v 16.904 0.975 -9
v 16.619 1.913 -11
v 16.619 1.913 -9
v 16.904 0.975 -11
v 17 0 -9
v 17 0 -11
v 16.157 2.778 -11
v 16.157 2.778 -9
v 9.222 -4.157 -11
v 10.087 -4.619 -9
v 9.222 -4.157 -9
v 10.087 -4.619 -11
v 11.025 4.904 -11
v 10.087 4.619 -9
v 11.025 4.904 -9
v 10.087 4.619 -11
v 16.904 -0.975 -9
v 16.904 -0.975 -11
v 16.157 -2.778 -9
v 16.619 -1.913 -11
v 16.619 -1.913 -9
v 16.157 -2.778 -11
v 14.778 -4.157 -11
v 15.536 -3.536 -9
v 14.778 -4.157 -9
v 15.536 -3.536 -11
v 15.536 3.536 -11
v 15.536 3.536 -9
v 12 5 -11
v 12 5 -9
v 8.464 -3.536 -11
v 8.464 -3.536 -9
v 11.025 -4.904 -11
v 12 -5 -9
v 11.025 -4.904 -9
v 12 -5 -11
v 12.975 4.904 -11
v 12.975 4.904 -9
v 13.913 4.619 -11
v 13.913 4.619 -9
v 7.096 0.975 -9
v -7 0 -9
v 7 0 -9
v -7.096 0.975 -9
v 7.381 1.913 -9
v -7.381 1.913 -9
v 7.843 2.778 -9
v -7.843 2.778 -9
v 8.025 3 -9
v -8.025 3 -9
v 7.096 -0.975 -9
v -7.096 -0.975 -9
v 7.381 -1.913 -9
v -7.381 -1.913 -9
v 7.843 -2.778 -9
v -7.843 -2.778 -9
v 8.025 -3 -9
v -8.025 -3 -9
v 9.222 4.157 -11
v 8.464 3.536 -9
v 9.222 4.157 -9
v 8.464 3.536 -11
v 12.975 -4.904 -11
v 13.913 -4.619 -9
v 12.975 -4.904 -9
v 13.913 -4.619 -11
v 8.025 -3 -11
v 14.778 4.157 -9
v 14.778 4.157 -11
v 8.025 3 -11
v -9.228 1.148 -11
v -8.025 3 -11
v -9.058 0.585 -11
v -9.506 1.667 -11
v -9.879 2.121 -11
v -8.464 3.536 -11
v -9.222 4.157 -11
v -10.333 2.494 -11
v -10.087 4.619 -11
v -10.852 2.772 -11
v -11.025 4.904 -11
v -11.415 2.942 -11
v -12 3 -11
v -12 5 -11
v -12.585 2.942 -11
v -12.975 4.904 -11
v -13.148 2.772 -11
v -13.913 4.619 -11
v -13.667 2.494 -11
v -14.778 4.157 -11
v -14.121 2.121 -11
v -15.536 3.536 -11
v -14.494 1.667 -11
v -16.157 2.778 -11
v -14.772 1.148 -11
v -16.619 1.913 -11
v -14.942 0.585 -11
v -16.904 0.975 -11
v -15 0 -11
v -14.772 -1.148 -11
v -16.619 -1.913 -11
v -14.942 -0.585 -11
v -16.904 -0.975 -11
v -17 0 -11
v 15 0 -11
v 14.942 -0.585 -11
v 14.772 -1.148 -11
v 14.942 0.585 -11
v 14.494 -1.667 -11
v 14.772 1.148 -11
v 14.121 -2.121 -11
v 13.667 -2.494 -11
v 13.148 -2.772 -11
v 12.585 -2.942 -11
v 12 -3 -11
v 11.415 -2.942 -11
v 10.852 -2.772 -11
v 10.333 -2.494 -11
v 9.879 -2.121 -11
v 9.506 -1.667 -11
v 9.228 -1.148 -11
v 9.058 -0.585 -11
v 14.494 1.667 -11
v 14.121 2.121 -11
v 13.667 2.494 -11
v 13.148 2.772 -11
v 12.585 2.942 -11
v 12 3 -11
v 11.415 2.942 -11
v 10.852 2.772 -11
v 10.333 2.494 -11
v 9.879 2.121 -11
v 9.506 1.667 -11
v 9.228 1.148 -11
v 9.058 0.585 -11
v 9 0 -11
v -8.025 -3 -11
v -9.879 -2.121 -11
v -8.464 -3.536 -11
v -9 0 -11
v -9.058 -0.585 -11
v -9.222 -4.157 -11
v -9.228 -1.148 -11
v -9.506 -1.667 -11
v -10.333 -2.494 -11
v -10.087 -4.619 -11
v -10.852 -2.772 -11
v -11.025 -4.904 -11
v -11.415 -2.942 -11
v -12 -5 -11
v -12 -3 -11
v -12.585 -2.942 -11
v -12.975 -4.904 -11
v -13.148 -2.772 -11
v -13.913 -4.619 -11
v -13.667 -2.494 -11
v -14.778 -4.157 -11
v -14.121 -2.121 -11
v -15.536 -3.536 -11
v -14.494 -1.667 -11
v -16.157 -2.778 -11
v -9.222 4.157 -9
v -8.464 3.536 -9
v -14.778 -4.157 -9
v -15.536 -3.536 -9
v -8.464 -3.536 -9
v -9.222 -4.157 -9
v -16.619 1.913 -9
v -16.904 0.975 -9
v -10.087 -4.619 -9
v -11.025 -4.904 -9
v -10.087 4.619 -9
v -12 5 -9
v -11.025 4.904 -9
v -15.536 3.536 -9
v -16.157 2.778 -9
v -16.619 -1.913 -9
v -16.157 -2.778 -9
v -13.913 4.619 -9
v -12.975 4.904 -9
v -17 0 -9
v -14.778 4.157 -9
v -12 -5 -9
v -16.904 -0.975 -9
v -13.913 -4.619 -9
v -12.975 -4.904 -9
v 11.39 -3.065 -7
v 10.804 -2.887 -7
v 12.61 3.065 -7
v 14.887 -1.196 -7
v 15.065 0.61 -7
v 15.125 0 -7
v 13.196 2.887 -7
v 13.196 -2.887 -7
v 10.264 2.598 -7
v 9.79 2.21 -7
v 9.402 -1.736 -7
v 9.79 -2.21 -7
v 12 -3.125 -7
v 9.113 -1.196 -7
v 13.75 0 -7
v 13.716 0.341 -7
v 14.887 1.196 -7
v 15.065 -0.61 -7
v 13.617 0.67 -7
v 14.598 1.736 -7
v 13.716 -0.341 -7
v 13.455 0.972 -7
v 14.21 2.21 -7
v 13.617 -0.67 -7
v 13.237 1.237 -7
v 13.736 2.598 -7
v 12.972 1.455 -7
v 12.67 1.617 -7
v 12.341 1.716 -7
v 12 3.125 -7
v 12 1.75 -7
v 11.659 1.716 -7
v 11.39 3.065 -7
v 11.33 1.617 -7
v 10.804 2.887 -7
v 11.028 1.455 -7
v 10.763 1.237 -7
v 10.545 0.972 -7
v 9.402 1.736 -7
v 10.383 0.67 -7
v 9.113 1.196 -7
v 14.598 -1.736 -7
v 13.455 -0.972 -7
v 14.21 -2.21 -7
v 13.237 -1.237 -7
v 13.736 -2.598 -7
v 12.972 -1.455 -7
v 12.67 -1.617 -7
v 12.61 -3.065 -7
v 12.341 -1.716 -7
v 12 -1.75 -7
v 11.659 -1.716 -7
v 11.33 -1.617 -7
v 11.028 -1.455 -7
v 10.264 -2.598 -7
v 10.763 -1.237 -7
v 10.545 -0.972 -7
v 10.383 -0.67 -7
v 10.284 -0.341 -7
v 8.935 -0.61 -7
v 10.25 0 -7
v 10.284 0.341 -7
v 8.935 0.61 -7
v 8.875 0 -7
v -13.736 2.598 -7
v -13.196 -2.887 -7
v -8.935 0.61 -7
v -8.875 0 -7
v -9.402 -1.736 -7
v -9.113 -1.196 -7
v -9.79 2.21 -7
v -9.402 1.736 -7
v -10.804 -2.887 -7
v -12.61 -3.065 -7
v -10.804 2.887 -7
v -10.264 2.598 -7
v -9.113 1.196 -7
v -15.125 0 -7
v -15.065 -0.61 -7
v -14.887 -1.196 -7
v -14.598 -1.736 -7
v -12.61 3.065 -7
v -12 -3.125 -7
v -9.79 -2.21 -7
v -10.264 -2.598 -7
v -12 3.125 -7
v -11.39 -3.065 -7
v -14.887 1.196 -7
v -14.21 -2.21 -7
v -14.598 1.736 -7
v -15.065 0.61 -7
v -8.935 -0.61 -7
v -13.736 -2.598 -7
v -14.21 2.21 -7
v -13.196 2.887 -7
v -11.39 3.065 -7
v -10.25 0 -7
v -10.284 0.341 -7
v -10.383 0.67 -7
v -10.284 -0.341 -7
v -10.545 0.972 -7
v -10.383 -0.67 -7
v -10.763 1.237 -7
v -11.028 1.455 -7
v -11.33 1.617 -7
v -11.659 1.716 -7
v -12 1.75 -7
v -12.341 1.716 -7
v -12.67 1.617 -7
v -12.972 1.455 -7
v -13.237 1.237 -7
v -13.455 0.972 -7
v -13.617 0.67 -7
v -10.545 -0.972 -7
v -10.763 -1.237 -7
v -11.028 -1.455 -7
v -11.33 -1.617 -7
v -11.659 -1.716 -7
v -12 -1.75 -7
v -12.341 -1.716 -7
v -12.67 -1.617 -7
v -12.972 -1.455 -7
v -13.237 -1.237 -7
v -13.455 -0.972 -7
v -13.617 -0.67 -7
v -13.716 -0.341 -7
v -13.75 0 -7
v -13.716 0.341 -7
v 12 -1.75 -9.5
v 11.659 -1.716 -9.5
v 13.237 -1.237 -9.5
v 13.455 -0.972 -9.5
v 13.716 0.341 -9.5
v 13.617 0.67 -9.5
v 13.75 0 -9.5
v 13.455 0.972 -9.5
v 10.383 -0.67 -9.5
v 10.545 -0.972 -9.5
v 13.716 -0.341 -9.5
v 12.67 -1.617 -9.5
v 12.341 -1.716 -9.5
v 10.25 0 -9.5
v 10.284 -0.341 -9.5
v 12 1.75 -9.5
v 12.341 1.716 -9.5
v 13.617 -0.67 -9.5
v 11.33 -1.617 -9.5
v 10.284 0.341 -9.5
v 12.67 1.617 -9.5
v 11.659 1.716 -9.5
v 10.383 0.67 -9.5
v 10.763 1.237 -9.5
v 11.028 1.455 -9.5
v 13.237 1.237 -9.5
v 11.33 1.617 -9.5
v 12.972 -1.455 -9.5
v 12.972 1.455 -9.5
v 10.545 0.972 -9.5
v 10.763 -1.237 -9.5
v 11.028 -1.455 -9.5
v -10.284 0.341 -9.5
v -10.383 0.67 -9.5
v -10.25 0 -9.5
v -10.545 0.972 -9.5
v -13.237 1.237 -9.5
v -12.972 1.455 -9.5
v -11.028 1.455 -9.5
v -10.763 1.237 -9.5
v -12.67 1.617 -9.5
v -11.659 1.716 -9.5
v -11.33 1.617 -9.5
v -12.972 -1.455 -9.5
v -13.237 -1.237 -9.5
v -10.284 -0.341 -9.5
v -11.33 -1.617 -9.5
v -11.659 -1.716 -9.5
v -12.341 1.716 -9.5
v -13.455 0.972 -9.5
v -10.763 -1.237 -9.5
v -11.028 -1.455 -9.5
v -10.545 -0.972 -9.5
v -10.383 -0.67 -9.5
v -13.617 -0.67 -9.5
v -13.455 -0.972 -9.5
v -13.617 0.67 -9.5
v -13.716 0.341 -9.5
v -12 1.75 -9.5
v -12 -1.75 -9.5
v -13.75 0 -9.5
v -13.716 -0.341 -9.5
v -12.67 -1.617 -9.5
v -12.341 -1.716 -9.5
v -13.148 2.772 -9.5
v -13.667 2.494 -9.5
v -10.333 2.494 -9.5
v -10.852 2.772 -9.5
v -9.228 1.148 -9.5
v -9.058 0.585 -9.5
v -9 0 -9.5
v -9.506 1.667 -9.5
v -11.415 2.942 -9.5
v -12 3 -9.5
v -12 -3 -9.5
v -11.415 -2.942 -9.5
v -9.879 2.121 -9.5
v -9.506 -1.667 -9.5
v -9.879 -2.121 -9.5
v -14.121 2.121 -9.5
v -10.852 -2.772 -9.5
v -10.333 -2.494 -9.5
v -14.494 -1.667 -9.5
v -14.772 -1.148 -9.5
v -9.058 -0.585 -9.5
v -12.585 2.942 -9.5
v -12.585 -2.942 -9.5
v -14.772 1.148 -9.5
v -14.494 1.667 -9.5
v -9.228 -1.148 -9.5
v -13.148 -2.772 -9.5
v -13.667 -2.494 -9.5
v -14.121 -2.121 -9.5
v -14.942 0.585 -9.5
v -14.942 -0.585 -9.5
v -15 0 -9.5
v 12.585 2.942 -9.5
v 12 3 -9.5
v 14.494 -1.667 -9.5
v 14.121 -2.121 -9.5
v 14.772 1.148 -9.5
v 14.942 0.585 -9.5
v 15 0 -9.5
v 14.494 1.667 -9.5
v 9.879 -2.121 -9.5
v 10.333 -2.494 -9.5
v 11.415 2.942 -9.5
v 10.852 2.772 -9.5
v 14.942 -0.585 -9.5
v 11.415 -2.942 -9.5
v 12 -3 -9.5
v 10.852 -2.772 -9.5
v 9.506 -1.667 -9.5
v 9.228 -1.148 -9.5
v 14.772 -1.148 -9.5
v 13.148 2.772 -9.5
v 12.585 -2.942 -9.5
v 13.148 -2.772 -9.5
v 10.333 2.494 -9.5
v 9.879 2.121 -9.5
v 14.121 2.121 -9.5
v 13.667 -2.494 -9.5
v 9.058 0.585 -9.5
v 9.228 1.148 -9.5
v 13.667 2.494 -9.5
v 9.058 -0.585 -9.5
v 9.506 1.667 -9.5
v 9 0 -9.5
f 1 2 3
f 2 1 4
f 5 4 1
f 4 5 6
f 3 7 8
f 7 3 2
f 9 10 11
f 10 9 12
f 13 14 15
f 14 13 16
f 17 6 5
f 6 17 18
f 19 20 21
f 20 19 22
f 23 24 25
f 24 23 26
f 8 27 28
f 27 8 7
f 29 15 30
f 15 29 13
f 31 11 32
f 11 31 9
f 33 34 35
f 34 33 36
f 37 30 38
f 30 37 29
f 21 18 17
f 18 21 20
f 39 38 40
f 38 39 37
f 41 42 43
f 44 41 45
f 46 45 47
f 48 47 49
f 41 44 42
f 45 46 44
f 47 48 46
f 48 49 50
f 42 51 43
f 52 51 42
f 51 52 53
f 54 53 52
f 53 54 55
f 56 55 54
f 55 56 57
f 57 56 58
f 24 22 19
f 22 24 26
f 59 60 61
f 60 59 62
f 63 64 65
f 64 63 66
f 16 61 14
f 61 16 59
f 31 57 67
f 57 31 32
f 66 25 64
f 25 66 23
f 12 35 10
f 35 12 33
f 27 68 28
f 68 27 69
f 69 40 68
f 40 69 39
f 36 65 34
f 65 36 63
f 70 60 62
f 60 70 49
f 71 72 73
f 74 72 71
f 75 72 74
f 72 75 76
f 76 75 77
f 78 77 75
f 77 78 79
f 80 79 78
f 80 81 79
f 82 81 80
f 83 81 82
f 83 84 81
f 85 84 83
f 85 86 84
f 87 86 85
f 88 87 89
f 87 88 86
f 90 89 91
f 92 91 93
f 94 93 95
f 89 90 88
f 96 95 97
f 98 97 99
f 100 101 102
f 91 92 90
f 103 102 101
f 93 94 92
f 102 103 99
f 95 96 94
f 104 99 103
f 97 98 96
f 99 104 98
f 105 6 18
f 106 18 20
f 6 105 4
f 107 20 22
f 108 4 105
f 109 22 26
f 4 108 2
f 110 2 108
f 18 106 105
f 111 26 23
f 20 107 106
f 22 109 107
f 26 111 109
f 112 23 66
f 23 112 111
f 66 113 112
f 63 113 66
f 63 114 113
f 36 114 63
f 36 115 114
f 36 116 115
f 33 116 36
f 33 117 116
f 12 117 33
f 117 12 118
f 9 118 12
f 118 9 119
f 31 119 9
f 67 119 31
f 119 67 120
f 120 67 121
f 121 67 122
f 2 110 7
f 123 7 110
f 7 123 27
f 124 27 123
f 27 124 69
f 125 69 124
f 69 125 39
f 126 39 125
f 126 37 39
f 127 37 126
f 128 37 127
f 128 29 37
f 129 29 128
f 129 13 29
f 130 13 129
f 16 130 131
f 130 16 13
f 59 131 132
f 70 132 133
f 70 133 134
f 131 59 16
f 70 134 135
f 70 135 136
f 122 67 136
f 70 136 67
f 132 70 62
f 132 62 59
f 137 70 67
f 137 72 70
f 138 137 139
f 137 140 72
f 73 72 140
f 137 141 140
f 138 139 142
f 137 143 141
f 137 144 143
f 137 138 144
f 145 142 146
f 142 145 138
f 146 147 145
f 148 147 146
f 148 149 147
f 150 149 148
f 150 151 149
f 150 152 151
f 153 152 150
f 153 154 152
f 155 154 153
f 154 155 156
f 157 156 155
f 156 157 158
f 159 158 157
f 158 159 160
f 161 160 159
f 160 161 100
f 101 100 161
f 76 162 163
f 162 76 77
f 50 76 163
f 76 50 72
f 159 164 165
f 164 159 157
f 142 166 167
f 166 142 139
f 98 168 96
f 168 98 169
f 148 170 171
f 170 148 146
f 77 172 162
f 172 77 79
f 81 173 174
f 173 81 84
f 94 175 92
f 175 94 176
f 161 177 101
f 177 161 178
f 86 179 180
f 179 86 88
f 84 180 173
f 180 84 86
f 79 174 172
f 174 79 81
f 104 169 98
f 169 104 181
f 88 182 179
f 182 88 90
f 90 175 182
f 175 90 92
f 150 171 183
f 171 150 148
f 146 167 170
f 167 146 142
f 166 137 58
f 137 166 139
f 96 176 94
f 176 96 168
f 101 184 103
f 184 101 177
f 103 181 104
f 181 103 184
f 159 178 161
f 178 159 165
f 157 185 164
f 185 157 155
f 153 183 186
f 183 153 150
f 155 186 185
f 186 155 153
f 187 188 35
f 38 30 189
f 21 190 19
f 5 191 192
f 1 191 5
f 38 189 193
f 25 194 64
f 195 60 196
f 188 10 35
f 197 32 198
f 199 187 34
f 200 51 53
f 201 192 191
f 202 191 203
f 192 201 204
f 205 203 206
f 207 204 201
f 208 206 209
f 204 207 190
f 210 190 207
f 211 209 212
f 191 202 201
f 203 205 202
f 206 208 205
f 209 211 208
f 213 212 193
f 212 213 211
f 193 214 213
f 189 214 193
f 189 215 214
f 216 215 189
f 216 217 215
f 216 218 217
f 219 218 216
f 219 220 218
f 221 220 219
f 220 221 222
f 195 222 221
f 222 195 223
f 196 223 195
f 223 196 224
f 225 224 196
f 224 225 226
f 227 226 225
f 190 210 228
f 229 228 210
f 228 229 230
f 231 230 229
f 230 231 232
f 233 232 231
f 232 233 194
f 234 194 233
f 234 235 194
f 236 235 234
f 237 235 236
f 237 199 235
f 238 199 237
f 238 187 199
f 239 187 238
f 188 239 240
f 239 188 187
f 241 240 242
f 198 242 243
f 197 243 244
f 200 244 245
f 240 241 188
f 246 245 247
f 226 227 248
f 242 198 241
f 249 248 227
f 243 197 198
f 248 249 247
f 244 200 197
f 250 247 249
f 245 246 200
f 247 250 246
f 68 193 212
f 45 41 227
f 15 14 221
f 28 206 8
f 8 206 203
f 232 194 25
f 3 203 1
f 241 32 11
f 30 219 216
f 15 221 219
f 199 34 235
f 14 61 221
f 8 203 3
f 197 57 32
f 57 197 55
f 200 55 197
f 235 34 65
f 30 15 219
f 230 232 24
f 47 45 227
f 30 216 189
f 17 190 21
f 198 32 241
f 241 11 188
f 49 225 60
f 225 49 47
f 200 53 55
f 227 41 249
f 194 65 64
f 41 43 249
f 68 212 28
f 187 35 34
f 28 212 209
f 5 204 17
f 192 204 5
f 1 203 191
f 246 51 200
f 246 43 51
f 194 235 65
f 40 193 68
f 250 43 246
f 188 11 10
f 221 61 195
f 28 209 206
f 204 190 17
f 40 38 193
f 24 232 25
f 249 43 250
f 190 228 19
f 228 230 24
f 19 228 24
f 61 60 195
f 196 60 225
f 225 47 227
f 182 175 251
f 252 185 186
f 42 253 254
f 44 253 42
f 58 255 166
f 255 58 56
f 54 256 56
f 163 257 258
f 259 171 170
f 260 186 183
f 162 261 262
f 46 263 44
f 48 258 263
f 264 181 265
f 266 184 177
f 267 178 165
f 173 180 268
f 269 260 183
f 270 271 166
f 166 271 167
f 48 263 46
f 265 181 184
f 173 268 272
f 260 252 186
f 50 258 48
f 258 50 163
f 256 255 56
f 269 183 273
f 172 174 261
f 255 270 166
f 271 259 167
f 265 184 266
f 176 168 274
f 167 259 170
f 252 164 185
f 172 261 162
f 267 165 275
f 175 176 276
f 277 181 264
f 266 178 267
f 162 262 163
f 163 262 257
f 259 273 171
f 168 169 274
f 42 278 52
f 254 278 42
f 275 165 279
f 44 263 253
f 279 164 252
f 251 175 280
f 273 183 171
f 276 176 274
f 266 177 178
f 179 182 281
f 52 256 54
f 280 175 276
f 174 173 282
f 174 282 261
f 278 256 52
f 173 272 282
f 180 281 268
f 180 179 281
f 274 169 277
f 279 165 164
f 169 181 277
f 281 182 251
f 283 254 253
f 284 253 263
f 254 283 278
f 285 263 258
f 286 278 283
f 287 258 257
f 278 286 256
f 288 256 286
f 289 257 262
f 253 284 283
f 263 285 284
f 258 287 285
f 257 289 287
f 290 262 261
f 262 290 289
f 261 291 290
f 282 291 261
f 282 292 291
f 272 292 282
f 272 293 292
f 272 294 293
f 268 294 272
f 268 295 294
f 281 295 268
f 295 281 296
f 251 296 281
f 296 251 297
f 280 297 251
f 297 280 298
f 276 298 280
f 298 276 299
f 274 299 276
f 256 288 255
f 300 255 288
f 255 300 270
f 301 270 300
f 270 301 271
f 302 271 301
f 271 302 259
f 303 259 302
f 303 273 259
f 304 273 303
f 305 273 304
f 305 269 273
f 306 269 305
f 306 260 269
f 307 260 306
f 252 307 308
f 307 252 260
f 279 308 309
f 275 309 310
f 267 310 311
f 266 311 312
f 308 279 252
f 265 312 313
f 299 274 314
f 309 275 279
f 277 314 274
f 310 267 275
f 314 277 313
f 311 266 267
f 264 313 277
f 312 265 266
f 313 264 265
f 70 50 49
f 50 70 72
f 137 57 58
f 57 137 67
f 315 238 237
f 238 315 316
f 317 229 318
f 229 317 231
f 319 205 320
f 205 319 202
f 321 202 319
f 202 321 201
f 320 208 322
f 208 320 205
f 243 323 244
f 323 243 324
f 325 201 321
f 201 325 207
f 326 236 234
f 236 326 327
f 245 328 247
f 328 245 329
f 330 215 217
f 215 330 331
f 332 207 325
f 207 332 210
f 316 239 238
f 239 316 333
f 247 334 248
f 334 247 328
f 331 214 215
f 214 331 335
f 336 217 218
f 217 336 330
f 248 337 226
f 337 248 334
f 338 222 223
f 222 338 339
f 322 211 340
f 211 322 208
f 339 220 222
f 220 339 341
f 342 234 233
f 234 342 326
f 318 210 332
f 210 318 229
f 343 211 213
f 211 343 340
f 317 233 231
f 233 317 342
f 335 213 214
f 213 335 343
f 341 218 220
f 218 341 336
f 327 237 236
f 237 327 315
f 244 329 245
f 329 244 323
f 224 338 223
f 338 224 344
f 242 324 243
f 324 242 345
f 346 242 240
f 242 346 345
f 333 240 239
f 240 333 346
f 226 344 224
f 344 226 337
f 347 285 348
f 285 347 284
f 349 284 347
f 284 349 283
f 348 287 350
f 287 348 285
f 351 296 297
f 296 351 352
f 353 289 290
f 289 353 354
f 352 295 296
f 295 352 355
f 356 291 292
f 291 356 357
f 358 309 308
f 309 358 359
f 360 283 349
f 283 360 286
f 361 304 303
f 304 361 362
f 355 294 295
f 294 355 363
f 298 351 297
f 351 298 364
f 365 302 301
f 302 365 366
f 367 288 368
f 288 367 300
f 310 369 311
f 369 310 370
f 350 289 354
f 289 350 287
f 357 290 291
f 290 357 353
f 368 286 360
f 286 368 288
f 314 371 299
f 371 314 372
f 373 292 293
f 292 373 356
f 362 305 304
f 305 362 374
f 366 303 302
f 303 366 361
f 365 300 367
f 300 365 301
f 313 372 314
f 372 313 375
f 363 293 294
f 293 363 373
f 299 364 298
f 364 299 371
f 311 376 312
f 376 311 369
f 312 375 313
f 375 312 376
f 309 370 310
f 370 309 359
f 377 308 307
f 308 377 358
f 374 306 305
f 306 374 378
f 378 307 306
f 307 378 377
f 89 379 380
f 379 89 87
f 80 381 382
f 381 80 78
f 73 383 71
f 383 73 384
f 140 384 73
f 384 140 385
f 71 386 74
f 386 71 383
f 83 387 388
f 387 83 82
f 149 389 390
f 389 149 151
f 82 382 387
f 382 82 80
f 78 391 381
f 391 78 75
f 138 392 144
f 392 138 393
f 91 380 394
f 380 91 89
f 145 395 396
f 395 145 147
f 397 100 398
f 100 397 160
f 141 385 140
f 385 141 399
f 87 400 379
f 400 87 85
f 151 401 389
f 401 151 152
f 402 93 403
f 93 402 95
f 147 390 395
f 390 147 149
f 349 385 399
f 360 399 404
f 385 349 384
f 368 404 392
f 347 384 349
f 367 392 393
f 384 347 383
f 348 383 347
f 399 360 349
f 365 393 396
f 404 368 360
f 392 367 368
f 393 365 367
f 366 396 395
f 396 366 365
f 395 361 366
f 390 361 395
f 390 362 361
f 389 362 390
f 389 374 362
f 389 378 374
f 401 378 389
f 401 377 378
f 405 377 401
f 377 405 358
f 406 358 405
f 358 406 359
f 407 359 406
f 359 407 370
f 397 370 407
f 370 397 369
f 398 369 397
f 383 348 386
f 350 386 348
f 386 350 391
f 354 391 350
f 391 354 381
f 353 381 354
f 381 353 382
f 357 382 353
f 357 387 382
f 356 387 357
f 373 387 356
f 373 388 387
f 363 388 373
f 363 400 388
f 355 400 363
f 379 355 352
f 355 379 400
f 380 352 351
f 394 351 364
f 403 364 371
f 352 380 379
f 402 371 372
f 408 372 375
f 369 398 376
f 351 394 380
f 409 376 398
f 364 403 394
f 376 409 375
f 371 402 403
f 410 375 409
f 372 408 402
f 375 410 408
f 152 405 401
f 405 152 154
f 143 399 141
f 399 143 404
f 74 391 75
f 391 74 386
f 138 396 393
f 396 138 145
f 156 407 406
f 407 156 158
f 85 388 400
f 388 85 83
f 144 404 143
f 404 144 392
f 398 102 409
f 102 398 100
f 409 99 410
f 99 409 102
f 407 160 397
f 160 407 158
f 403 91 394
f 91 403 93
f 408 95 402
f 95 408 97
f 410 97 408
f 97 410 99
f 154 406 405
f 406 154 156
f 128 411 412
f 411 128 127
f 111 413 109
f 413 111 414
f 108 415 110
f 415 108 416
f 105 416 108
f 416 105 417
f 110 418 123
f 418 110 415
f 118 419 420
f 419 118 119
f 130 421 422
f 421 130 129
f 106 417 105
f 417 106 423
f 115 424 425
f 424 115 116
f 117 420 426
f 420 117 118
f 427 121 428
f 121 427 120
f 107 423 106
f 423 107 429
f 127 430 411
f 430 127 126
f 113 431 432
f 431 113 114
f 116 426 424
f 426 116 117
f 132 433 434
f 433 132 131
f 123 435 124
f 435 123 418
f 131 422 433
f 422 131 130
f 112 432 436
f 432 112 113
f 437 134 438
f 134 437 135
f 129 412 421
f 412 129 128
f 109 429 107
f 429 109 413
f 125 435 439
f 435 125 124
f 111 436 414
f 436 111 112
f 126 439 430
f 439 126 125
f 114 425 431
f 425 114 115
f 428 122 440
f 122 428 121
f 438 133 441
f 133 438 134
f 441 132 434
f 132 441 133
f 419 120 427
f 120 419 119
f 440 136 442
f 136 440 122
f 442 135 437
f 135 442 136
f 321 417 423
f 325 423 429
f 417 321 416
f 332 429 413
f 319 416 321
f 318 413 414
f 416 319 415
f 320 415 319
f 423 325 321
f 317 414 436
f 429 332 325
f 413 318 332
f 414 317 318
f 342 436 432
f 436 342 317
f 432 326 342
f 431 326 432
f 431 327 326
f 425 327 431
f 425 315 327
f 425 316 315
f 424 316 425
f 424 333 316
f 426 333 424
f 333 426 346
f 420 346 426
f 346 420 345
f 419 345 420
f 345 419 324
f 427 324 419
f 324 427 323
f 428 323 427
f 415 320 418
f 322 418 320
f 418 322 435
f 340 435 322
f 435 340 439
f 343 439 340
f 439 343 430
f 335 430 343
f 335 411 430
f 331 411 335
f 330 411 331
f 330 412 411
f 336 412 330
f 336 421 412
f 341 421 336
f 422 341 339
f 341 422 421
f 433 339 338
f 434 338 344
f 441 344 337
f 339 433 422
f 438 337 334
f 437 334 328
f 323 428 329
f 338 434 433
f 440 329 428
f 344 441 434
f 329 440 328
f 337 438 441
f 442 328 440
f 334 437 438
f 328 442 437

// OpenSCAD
$fn=32;
r1=12;

color("silver") {
 // beltHangClip();
  translate([0,0,-11]) beltHangClipBack();
}
module beltHangClip() {
  difference() {
    scale([1,1,0.5]) rotate([90,0,0]) torus(r1,5);
    translate([0,0,-50]) cylinder(r=50,h=50);
  }
  translate([r1,0,-6]) post();
  translate([-r1,0,-6]) post();
}

module beltHangClipBack() {

    difference() {    
      union() {
        translate([r1,0,0]) cylinder(r=5,h=2);
        translate([-r1,0,0]) cylinder(r=5,h=2);
        translate([r1,0,2]) cylinder(r1=5,r2=3.125,h=2);
        translate([-r1,0,2]) cylinder(r1=5,r2=3.125,h=2);
        translate([-r1,-3,0]) cube([r1*2,6,2]);
      }
      translate([r1,0,-0.1]) cylinder(r=1.75,h=8.2);
      translate([-r1,0,-0.1]) cylinder(r=1.75,h=8.2);

      translate([-r1,0,-0.1]) cylinder(r=3,h=1.6);
      translate([r1,0,-0.1]) cylinder(r=3,h=1.6);

    }

}

module post() {
  difference() {
    union() {
      cylinder(r=3.125,h=6);
      translate([0,0,4]) cylinder(r1=3.125,r2=5,h=2);
    }
    translate([0,0,-0.5]) cylinder(r=1.49,h=10);
  }
}

module torus(r1,r2) {
  rotate_extrude(convexity = 10, $fn=$fn)
    translate([r1, 0, 0])
    circle(r = r2, $fn=$fn);
}
